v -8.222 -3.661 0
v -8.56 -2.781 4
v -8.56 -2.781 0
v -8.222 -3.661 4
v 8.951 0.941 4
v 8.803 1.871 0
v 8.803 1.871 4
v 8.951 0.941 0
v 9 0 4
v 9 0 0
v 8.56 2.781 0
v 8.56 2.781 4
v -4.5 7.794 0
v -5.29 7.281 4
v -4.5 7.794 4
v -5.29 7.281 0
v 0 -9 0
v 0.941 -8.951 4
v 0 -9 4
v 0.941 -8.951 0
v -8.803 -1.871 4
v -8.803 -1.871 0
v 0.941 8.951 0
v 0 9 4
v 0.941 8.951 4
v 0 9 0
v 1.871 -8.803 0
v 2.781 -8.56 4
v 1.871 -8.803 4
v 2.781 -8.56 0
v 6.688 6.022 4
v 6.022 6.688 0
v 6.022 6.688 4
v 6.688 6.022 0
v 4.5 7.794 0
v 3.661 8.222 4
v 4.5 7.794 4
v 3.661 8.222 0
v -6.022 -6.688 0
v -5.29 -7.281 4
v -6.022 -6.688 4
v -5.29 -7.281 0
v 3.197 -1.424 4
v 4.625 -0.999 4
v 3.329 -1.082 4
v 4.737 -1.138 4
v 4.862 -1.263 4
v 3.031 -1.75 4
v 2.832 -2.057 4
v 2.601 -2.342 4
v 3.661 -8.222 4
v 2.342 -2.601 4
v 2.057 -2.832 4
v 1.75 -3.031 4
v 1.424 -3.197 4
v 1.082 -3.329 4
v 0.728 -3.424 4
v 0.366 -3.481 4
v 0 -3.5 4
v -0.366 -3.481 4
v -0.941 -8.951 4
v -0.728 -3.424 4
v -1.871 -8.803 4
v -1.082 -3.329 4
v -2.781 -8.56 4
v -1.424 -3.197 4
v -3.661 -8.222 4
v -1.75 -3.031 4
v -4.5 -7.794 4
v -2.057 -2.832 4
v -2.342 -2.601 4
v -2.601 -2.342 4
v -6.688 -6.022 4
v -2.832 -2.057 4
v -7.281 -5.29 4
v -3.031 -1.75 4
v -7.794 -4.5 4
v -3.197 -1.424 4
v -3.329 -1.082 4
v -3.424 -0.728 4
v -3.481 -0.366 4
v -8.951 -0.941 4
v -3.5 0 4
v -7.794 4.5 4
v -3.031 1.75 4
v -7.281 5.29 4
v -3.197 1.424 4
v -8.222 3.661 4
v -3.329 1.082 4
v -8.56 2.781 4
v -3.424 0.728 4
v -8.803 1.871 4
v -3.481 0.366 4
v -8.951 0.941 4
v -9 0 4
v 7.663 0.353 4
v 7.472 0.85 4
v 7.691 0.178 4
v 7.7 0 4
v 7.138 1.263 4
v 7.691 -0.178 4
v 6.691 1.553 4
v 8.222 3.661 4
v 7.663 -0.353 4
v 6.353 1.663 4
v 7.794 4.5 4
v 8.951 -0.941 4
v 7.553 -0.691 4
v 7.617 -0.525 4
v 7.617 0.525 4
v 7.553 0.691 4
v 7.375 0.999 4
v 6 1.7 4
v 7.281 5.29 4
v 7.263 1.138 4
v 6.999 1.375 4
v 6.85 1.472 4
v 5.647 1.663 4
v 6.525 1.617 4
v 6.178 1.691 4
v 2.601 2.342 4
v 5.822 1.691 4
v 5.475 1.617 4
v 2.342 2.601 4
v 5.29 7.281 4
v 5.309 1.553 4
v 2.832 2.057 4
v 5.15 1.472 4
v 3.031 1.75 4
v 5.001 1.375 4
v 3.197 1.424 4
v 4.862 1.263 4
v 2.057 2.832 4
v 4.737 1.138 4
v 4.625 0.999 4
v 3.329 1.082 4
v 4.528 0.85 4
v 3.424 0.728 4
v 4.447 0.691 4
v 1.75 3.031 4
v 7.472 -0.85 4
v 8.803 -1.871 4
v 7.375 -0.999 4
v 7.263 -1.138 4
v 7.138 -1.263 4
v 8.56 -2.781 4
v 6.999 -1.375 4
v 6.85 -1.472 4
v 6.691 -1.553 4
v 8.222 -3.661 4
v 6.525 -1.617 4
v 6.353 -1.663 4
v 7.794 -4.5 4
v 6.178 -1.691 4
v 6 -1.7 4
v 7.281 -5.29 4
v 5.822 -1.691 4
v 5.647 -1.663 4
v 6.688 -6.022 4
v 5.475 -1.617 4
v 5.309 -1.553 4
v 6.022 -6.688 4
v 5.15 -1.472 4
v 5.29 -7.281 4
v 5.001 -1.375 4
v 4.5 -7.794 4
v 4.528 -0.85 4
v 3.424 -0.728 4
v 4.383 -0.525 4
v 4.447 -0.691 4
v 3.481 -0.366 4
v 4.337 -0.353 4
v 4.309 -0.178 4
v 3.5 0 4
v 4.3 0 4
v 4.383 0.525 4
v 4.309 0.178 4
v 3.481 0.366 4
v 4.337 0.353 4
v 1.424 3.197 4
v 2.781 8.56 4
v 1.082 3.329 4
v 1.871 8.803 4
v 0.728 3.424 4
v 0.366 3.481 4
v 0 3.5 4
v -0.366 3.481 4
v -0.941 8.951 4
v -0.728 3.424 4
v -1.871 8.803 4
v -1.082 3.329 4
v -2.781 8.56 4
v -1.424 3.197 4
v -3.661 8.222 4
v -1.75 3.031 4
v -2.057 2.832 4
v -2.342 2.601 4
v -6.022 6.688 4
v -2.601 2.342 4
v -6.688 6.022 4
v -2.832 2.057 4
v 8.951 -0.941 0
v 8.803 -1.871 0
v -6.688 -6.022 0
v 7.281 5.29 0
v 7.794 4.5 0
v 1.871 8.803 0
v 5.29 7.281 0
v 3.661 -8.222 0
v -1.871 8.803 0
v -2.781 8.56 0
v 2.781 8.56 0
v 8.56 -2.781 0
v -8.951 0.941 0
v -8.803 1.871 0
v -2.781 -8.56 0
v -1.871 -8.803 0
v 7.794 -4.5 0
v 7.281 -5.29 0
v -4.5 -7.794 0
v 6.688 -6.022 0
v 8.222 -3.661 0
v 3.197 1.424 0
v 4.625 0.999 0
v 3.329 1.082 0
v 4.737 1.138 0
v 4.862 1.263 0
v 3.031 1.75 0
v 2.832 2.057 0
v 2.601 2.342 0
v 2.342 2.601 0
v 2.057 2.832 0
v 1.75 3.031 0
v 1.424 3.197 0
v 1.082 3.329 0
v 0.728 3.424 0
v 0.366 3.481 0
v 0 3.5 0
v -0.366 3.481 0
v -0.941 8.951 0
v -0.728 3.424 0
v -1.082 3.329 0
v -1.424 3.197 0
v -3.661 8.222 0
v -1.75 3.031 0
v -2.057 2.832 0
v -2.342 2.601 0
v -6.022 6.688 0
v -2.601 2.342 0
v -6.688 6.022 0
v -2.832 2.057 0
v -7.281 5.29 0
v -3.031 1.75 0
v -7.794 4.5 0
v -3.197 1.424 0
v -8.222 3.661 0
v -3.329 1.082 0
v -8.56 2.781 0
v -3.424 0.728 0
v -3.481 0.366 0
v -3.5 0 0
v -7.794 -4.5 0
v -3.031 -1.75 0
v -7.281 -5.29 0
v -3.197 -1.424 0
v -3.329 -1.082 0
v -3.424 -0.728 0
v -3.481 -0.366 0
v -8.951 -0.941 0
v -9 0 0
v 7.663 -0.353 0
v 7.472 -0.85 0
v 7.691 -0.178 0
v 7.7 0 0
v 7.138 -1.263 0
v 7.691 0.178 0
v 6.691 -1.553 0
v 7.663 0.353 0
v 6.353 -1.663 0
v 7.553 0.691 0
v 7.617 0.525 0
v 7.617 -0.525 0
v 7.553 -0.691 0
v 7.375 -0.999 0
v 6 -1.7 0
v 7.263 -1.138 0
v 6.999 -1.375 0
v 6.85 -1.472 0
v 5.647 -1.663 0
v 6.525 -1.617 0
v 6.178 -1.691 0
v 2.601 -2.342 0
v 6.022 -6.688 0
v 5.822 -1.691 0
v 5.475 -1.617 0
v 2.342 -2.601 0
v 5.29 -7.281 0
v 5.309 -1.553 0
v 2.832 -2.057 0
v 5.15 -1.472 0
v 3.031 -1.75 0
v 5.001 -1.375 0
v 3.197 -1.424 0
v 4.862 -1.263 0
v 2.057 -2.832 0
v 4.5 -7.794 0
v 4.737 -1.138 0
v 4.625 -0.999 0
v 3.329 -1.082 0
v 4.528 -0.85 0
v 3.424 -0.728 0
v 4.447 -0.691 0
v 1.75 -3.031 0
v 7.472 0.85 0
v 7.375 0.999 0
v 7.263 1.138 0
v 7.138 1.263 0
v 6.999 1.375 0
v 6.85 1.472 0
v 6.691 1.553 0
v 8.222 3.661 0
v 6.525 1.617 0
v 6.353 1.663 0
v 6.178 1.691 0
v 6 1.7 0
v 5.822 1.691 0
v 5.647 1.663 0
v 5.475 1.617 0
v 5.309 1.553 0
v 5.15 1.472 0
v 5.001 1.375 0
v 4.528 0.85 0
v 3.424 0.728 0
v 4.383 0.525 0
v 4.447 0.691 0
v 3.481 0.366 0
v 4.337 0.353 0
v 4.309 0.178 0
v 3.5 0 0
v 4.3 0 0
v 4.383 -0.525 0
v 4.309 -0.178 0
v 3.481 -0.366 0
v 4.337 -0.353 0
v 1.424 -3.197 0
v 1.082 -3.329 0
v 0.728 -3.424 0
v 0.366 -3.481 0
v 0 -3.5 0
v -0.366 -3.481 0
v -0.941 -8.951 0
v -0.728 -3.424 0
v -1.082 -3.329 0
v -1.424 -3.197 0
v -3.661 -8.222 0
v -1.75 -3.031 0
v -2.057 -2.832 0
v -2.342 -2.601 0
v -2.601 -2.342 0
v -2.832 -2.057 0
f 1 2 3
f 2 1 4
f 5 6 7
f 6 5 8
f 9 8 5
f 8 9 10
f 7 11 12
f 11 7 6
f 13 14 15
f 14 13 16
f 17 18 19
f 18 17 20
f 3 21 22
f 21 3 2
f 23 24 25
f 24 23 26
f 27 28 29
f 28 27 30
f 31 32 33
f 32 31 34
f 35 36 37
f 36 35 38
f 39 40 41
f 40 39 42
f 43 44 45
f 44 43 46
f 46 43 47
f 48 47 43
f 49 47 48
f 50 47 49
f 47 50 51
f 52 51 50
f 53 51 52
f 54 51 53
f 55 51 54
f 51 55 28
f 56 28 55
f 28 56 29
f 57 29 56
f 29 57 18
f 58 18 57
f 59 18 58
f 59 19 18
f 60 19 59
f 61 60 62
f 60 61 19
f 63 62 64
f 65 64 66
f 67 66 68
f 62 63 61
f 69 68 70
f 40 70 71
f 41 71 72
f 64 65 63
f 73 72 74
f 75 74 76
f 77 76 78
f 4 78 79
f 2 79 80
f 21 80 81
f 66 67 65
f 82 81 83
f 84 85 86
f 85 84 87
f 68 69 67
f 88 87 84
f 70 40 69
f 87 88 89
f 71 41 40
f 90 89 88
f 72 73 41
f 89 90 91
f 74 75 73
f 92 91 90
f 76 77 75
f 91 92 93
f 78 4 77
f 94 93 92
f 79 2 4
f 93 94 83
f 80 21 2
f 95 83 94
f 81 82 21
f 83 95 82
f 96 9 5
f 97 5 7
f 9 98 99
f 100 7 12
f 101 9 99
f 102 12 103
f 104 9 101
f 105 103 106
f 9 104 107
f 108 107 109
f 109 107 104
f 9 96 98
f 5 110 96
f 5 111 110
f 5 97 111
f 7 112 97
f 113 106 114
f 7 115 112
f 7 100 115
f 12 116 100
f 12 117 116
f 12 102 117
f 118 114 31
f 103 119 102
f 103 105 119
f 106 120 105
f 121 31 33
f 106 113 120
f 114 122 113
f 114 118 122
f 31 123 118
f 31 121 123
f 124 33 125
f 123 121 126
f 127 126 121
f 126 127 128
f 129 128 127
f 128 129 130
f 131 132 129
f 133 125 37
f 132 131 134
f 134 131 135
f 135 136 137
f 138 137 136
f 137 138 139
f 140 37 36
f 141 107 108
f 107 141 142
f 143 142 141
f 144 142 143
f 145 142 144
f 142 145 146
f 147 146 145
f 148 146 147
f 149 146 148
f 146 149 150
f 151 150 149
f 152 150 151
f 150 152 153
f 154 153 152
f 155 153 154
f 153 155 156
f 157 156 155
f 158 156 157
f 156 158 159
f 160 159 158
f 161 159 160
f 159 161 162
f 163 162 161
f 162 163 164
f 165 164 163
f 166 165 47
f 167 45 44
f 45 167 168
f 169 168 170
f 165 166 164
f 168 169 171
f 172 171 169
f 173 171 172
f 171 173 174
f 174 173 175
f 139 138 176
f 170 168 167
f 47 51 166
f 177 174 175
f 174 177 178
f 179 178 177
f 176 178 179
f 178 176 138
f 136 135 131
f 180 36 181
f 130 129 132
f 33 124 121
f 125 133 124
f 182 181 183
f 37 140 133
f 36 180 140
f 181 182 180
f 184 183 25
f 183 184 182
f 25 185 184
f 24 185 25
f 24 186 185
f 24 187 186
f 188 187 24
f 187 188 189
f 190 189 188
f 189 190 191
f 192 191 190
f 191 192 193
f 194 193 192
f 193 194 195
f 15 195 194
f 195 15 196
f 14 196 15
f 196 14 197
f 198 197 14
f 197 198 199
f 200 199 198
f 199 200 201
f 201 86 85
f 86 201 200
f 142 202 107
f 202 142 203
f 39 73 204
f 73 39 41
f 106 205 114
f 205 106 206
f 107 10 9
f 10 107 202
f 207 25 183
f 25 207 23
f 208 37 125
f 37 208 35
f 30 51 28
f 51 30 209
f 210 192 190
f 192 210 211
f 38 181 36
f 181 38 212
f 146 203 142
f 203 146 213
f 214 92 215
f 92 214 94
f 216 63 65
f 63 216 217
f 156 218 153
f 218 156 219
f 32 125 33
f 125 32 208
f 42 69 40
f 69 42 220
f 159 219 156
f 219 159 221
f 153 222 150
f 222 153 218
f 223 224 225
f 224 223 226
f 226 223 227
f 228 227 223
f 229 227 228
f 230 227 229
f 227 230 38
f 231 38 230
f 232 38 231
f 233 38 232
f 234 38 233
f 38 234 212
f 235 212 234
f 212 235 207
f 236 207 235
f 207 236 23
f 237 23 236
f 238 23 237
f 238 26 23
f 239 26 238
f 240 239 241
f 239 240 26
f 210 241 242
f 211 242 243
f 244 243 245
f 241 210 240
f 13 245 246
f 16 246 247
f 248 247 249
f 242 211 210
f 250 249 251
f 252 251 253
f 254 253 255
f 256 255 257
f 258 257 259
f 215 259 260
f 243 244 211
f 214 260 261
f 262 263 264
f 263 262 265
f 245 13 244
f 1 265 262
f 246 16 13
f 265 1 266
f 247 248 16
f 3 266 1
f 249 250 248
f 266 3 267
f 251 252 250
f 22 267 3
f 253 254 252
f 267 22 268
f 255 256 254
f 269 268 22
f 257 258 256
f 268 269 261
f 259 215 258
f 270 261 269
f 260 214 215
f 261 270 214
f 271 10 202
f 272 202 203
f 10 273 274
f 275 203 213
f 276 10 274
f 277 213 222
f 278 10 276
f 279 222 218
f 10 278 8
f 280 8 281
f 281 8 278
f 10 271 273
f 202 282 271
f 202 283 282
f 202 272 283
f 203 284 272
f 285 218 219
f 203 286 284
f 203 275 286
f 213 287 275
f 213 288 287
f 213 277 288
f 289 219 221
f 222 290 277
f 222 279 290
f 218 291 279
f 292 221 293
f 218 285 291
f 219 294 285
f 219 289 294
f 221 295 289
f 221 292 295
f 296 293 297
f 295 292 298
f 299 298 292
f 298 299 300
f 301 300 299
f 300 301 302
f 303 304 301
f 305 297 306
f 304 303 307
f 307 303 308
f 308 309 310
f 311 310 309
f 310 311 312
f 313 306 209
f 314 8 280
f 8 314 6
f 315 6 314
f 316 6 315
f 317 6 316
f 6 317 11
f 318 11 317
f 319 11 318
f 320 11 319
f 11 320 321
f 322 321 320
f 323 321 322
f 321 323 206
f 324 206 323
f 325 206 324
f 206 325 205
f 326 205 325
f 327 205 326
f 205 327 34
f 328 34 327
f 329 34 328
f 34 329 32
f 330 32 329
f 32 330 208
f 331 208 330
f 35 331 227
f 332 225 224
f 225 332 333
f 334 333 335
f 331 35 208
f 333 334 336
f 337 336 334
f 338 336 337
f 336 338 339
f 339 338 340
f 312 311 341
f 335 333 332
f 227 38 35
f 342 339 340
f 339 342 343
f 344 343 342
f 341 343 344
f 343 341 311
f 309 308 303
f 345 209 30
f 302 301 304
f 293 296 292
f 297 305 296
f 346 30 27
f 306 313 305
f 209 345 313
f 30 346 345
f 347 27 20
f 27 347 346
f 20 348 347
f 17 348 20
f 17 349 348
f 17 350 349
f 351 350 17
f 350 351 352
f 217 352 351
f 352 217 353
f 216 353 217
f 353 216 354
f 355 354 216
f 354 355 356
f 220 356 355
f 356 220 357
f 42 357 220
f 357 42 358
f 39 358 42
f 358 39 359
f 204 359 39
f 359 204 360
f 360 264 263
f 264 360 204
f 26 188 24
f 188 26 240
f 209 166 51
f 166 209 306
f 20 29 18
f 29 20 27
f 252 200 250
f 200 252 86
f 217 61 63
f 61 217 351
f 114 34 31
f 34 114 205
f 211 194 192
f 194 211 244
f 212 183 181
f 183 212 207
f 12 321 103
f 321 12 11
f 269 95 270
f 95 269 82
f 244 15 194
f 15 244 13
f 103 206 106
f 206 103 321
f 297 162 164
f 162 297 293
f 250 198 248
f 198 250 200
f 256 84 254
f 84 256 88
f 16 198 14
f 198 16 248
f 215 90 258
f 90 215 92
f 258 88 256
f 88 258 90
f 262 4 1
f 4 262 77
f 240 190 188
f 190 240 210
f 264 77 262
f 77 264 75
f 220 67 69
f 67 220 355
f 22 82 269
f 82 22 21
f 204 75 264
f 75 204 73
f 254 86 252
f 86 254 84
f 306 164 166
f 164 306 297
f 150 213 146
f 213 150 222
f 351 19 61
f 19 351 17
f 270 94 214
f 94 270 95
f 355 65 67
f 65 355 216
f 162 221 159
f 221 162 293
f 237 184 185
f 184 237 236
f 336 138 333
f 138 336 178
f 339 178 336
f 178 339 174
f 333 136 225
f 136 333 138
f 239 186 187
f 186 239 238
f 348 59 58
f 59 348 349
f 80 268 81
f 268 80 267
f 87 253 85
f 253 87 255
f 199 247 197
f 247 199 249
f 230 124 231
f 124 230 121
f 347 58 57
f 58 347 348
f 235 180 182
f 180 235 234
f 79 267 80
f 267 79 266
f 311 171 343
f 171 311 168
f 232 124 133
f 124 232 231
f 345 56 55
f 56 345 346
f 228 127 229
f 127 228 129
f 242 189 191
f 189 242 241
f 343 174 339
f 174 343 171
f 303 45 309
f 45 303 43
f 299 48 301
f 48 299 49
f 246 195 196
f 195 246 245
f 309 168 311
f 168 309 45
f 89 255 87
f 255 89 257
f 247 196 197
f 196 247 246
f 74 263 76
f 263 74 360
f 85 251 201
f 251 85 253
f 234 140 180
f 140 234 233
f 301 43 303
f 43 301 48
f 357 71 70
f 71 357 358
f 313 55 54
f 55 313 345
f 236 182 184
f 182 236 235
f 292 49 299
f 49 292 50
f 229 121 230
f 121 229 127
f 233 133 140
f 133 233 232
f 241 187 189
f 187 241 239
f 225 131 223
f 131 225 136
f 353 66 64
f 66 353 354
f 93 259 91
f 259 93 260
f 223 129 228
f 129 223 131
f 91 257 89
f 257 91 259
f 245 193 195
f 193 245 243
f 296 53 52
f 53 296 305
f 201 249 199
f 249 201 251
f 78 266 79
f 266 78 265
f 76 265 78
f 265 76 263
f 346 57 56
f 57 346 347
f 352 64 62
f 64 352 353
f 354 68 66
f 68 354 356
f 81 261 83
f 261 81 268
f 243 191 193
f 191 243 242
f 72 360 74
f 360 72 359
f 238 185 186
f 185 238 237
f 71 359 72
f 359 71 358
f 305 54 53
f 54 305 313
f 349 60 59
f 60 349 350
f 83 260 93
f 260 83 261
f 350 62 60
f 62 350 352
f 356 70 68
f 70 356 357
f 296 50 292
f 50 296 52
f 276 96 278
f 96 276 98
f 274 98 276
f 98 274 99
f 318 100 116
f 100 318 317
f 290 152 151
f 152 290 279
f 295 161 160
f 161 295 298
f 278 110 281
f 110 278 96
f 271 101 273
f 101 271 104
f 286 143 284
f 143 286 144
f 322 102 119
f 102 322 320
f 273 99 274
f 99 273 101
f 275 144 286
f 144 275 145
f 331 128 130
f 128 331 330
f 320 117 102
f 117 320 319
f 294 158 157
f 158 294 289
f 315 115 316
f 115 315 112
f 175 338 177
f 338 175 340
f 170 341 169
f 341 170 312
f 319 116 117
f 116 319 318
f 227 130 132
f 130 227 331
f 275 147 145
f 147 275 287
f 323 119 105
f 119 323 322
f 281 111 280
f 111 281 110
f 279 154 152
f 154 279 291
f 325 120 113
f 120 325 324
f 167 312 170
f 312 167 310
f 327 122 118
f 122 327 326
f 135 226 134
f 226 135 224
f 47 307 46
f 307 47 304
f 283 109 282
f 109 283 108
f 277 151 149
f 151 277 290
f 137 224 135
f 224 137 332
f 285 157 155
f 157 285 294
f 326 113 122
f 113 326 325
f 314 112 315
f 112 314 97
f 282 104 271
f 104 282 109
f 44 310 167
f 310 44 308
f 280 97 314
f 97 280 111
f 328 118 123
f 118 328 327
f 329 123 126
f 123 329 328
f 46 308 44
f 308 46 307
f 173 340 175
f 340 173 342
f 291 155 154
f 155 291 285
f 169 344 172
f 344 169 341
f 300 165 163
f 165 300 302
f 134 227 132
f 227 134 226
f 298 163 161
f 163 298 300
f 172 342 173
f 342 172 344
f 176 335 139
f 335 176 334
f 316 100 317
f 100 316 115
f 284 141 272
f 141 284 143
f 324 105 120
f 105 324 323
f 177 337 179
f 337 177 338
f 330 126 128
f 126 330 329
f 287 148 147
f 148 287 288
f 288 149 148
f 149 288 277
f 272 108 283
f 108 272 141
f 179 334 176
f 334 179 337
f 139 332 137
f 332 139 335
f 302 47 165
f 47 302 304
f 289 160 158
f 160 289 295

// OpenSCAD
// Closed cable guide ring.
$fn = 60;
eps = 0.02;
cable_d = 7;
outer_d = 18;
thickness = 4;
difference() { cylinder(d=outer_d,h=thickness); translate([0,0,-eps]) cylinder(d=cable_d,h=thickness+2*eps); translate([outer_d/2-3,0,-eps]) cylinder(d=3.4,h=thickness+2*eps); }
